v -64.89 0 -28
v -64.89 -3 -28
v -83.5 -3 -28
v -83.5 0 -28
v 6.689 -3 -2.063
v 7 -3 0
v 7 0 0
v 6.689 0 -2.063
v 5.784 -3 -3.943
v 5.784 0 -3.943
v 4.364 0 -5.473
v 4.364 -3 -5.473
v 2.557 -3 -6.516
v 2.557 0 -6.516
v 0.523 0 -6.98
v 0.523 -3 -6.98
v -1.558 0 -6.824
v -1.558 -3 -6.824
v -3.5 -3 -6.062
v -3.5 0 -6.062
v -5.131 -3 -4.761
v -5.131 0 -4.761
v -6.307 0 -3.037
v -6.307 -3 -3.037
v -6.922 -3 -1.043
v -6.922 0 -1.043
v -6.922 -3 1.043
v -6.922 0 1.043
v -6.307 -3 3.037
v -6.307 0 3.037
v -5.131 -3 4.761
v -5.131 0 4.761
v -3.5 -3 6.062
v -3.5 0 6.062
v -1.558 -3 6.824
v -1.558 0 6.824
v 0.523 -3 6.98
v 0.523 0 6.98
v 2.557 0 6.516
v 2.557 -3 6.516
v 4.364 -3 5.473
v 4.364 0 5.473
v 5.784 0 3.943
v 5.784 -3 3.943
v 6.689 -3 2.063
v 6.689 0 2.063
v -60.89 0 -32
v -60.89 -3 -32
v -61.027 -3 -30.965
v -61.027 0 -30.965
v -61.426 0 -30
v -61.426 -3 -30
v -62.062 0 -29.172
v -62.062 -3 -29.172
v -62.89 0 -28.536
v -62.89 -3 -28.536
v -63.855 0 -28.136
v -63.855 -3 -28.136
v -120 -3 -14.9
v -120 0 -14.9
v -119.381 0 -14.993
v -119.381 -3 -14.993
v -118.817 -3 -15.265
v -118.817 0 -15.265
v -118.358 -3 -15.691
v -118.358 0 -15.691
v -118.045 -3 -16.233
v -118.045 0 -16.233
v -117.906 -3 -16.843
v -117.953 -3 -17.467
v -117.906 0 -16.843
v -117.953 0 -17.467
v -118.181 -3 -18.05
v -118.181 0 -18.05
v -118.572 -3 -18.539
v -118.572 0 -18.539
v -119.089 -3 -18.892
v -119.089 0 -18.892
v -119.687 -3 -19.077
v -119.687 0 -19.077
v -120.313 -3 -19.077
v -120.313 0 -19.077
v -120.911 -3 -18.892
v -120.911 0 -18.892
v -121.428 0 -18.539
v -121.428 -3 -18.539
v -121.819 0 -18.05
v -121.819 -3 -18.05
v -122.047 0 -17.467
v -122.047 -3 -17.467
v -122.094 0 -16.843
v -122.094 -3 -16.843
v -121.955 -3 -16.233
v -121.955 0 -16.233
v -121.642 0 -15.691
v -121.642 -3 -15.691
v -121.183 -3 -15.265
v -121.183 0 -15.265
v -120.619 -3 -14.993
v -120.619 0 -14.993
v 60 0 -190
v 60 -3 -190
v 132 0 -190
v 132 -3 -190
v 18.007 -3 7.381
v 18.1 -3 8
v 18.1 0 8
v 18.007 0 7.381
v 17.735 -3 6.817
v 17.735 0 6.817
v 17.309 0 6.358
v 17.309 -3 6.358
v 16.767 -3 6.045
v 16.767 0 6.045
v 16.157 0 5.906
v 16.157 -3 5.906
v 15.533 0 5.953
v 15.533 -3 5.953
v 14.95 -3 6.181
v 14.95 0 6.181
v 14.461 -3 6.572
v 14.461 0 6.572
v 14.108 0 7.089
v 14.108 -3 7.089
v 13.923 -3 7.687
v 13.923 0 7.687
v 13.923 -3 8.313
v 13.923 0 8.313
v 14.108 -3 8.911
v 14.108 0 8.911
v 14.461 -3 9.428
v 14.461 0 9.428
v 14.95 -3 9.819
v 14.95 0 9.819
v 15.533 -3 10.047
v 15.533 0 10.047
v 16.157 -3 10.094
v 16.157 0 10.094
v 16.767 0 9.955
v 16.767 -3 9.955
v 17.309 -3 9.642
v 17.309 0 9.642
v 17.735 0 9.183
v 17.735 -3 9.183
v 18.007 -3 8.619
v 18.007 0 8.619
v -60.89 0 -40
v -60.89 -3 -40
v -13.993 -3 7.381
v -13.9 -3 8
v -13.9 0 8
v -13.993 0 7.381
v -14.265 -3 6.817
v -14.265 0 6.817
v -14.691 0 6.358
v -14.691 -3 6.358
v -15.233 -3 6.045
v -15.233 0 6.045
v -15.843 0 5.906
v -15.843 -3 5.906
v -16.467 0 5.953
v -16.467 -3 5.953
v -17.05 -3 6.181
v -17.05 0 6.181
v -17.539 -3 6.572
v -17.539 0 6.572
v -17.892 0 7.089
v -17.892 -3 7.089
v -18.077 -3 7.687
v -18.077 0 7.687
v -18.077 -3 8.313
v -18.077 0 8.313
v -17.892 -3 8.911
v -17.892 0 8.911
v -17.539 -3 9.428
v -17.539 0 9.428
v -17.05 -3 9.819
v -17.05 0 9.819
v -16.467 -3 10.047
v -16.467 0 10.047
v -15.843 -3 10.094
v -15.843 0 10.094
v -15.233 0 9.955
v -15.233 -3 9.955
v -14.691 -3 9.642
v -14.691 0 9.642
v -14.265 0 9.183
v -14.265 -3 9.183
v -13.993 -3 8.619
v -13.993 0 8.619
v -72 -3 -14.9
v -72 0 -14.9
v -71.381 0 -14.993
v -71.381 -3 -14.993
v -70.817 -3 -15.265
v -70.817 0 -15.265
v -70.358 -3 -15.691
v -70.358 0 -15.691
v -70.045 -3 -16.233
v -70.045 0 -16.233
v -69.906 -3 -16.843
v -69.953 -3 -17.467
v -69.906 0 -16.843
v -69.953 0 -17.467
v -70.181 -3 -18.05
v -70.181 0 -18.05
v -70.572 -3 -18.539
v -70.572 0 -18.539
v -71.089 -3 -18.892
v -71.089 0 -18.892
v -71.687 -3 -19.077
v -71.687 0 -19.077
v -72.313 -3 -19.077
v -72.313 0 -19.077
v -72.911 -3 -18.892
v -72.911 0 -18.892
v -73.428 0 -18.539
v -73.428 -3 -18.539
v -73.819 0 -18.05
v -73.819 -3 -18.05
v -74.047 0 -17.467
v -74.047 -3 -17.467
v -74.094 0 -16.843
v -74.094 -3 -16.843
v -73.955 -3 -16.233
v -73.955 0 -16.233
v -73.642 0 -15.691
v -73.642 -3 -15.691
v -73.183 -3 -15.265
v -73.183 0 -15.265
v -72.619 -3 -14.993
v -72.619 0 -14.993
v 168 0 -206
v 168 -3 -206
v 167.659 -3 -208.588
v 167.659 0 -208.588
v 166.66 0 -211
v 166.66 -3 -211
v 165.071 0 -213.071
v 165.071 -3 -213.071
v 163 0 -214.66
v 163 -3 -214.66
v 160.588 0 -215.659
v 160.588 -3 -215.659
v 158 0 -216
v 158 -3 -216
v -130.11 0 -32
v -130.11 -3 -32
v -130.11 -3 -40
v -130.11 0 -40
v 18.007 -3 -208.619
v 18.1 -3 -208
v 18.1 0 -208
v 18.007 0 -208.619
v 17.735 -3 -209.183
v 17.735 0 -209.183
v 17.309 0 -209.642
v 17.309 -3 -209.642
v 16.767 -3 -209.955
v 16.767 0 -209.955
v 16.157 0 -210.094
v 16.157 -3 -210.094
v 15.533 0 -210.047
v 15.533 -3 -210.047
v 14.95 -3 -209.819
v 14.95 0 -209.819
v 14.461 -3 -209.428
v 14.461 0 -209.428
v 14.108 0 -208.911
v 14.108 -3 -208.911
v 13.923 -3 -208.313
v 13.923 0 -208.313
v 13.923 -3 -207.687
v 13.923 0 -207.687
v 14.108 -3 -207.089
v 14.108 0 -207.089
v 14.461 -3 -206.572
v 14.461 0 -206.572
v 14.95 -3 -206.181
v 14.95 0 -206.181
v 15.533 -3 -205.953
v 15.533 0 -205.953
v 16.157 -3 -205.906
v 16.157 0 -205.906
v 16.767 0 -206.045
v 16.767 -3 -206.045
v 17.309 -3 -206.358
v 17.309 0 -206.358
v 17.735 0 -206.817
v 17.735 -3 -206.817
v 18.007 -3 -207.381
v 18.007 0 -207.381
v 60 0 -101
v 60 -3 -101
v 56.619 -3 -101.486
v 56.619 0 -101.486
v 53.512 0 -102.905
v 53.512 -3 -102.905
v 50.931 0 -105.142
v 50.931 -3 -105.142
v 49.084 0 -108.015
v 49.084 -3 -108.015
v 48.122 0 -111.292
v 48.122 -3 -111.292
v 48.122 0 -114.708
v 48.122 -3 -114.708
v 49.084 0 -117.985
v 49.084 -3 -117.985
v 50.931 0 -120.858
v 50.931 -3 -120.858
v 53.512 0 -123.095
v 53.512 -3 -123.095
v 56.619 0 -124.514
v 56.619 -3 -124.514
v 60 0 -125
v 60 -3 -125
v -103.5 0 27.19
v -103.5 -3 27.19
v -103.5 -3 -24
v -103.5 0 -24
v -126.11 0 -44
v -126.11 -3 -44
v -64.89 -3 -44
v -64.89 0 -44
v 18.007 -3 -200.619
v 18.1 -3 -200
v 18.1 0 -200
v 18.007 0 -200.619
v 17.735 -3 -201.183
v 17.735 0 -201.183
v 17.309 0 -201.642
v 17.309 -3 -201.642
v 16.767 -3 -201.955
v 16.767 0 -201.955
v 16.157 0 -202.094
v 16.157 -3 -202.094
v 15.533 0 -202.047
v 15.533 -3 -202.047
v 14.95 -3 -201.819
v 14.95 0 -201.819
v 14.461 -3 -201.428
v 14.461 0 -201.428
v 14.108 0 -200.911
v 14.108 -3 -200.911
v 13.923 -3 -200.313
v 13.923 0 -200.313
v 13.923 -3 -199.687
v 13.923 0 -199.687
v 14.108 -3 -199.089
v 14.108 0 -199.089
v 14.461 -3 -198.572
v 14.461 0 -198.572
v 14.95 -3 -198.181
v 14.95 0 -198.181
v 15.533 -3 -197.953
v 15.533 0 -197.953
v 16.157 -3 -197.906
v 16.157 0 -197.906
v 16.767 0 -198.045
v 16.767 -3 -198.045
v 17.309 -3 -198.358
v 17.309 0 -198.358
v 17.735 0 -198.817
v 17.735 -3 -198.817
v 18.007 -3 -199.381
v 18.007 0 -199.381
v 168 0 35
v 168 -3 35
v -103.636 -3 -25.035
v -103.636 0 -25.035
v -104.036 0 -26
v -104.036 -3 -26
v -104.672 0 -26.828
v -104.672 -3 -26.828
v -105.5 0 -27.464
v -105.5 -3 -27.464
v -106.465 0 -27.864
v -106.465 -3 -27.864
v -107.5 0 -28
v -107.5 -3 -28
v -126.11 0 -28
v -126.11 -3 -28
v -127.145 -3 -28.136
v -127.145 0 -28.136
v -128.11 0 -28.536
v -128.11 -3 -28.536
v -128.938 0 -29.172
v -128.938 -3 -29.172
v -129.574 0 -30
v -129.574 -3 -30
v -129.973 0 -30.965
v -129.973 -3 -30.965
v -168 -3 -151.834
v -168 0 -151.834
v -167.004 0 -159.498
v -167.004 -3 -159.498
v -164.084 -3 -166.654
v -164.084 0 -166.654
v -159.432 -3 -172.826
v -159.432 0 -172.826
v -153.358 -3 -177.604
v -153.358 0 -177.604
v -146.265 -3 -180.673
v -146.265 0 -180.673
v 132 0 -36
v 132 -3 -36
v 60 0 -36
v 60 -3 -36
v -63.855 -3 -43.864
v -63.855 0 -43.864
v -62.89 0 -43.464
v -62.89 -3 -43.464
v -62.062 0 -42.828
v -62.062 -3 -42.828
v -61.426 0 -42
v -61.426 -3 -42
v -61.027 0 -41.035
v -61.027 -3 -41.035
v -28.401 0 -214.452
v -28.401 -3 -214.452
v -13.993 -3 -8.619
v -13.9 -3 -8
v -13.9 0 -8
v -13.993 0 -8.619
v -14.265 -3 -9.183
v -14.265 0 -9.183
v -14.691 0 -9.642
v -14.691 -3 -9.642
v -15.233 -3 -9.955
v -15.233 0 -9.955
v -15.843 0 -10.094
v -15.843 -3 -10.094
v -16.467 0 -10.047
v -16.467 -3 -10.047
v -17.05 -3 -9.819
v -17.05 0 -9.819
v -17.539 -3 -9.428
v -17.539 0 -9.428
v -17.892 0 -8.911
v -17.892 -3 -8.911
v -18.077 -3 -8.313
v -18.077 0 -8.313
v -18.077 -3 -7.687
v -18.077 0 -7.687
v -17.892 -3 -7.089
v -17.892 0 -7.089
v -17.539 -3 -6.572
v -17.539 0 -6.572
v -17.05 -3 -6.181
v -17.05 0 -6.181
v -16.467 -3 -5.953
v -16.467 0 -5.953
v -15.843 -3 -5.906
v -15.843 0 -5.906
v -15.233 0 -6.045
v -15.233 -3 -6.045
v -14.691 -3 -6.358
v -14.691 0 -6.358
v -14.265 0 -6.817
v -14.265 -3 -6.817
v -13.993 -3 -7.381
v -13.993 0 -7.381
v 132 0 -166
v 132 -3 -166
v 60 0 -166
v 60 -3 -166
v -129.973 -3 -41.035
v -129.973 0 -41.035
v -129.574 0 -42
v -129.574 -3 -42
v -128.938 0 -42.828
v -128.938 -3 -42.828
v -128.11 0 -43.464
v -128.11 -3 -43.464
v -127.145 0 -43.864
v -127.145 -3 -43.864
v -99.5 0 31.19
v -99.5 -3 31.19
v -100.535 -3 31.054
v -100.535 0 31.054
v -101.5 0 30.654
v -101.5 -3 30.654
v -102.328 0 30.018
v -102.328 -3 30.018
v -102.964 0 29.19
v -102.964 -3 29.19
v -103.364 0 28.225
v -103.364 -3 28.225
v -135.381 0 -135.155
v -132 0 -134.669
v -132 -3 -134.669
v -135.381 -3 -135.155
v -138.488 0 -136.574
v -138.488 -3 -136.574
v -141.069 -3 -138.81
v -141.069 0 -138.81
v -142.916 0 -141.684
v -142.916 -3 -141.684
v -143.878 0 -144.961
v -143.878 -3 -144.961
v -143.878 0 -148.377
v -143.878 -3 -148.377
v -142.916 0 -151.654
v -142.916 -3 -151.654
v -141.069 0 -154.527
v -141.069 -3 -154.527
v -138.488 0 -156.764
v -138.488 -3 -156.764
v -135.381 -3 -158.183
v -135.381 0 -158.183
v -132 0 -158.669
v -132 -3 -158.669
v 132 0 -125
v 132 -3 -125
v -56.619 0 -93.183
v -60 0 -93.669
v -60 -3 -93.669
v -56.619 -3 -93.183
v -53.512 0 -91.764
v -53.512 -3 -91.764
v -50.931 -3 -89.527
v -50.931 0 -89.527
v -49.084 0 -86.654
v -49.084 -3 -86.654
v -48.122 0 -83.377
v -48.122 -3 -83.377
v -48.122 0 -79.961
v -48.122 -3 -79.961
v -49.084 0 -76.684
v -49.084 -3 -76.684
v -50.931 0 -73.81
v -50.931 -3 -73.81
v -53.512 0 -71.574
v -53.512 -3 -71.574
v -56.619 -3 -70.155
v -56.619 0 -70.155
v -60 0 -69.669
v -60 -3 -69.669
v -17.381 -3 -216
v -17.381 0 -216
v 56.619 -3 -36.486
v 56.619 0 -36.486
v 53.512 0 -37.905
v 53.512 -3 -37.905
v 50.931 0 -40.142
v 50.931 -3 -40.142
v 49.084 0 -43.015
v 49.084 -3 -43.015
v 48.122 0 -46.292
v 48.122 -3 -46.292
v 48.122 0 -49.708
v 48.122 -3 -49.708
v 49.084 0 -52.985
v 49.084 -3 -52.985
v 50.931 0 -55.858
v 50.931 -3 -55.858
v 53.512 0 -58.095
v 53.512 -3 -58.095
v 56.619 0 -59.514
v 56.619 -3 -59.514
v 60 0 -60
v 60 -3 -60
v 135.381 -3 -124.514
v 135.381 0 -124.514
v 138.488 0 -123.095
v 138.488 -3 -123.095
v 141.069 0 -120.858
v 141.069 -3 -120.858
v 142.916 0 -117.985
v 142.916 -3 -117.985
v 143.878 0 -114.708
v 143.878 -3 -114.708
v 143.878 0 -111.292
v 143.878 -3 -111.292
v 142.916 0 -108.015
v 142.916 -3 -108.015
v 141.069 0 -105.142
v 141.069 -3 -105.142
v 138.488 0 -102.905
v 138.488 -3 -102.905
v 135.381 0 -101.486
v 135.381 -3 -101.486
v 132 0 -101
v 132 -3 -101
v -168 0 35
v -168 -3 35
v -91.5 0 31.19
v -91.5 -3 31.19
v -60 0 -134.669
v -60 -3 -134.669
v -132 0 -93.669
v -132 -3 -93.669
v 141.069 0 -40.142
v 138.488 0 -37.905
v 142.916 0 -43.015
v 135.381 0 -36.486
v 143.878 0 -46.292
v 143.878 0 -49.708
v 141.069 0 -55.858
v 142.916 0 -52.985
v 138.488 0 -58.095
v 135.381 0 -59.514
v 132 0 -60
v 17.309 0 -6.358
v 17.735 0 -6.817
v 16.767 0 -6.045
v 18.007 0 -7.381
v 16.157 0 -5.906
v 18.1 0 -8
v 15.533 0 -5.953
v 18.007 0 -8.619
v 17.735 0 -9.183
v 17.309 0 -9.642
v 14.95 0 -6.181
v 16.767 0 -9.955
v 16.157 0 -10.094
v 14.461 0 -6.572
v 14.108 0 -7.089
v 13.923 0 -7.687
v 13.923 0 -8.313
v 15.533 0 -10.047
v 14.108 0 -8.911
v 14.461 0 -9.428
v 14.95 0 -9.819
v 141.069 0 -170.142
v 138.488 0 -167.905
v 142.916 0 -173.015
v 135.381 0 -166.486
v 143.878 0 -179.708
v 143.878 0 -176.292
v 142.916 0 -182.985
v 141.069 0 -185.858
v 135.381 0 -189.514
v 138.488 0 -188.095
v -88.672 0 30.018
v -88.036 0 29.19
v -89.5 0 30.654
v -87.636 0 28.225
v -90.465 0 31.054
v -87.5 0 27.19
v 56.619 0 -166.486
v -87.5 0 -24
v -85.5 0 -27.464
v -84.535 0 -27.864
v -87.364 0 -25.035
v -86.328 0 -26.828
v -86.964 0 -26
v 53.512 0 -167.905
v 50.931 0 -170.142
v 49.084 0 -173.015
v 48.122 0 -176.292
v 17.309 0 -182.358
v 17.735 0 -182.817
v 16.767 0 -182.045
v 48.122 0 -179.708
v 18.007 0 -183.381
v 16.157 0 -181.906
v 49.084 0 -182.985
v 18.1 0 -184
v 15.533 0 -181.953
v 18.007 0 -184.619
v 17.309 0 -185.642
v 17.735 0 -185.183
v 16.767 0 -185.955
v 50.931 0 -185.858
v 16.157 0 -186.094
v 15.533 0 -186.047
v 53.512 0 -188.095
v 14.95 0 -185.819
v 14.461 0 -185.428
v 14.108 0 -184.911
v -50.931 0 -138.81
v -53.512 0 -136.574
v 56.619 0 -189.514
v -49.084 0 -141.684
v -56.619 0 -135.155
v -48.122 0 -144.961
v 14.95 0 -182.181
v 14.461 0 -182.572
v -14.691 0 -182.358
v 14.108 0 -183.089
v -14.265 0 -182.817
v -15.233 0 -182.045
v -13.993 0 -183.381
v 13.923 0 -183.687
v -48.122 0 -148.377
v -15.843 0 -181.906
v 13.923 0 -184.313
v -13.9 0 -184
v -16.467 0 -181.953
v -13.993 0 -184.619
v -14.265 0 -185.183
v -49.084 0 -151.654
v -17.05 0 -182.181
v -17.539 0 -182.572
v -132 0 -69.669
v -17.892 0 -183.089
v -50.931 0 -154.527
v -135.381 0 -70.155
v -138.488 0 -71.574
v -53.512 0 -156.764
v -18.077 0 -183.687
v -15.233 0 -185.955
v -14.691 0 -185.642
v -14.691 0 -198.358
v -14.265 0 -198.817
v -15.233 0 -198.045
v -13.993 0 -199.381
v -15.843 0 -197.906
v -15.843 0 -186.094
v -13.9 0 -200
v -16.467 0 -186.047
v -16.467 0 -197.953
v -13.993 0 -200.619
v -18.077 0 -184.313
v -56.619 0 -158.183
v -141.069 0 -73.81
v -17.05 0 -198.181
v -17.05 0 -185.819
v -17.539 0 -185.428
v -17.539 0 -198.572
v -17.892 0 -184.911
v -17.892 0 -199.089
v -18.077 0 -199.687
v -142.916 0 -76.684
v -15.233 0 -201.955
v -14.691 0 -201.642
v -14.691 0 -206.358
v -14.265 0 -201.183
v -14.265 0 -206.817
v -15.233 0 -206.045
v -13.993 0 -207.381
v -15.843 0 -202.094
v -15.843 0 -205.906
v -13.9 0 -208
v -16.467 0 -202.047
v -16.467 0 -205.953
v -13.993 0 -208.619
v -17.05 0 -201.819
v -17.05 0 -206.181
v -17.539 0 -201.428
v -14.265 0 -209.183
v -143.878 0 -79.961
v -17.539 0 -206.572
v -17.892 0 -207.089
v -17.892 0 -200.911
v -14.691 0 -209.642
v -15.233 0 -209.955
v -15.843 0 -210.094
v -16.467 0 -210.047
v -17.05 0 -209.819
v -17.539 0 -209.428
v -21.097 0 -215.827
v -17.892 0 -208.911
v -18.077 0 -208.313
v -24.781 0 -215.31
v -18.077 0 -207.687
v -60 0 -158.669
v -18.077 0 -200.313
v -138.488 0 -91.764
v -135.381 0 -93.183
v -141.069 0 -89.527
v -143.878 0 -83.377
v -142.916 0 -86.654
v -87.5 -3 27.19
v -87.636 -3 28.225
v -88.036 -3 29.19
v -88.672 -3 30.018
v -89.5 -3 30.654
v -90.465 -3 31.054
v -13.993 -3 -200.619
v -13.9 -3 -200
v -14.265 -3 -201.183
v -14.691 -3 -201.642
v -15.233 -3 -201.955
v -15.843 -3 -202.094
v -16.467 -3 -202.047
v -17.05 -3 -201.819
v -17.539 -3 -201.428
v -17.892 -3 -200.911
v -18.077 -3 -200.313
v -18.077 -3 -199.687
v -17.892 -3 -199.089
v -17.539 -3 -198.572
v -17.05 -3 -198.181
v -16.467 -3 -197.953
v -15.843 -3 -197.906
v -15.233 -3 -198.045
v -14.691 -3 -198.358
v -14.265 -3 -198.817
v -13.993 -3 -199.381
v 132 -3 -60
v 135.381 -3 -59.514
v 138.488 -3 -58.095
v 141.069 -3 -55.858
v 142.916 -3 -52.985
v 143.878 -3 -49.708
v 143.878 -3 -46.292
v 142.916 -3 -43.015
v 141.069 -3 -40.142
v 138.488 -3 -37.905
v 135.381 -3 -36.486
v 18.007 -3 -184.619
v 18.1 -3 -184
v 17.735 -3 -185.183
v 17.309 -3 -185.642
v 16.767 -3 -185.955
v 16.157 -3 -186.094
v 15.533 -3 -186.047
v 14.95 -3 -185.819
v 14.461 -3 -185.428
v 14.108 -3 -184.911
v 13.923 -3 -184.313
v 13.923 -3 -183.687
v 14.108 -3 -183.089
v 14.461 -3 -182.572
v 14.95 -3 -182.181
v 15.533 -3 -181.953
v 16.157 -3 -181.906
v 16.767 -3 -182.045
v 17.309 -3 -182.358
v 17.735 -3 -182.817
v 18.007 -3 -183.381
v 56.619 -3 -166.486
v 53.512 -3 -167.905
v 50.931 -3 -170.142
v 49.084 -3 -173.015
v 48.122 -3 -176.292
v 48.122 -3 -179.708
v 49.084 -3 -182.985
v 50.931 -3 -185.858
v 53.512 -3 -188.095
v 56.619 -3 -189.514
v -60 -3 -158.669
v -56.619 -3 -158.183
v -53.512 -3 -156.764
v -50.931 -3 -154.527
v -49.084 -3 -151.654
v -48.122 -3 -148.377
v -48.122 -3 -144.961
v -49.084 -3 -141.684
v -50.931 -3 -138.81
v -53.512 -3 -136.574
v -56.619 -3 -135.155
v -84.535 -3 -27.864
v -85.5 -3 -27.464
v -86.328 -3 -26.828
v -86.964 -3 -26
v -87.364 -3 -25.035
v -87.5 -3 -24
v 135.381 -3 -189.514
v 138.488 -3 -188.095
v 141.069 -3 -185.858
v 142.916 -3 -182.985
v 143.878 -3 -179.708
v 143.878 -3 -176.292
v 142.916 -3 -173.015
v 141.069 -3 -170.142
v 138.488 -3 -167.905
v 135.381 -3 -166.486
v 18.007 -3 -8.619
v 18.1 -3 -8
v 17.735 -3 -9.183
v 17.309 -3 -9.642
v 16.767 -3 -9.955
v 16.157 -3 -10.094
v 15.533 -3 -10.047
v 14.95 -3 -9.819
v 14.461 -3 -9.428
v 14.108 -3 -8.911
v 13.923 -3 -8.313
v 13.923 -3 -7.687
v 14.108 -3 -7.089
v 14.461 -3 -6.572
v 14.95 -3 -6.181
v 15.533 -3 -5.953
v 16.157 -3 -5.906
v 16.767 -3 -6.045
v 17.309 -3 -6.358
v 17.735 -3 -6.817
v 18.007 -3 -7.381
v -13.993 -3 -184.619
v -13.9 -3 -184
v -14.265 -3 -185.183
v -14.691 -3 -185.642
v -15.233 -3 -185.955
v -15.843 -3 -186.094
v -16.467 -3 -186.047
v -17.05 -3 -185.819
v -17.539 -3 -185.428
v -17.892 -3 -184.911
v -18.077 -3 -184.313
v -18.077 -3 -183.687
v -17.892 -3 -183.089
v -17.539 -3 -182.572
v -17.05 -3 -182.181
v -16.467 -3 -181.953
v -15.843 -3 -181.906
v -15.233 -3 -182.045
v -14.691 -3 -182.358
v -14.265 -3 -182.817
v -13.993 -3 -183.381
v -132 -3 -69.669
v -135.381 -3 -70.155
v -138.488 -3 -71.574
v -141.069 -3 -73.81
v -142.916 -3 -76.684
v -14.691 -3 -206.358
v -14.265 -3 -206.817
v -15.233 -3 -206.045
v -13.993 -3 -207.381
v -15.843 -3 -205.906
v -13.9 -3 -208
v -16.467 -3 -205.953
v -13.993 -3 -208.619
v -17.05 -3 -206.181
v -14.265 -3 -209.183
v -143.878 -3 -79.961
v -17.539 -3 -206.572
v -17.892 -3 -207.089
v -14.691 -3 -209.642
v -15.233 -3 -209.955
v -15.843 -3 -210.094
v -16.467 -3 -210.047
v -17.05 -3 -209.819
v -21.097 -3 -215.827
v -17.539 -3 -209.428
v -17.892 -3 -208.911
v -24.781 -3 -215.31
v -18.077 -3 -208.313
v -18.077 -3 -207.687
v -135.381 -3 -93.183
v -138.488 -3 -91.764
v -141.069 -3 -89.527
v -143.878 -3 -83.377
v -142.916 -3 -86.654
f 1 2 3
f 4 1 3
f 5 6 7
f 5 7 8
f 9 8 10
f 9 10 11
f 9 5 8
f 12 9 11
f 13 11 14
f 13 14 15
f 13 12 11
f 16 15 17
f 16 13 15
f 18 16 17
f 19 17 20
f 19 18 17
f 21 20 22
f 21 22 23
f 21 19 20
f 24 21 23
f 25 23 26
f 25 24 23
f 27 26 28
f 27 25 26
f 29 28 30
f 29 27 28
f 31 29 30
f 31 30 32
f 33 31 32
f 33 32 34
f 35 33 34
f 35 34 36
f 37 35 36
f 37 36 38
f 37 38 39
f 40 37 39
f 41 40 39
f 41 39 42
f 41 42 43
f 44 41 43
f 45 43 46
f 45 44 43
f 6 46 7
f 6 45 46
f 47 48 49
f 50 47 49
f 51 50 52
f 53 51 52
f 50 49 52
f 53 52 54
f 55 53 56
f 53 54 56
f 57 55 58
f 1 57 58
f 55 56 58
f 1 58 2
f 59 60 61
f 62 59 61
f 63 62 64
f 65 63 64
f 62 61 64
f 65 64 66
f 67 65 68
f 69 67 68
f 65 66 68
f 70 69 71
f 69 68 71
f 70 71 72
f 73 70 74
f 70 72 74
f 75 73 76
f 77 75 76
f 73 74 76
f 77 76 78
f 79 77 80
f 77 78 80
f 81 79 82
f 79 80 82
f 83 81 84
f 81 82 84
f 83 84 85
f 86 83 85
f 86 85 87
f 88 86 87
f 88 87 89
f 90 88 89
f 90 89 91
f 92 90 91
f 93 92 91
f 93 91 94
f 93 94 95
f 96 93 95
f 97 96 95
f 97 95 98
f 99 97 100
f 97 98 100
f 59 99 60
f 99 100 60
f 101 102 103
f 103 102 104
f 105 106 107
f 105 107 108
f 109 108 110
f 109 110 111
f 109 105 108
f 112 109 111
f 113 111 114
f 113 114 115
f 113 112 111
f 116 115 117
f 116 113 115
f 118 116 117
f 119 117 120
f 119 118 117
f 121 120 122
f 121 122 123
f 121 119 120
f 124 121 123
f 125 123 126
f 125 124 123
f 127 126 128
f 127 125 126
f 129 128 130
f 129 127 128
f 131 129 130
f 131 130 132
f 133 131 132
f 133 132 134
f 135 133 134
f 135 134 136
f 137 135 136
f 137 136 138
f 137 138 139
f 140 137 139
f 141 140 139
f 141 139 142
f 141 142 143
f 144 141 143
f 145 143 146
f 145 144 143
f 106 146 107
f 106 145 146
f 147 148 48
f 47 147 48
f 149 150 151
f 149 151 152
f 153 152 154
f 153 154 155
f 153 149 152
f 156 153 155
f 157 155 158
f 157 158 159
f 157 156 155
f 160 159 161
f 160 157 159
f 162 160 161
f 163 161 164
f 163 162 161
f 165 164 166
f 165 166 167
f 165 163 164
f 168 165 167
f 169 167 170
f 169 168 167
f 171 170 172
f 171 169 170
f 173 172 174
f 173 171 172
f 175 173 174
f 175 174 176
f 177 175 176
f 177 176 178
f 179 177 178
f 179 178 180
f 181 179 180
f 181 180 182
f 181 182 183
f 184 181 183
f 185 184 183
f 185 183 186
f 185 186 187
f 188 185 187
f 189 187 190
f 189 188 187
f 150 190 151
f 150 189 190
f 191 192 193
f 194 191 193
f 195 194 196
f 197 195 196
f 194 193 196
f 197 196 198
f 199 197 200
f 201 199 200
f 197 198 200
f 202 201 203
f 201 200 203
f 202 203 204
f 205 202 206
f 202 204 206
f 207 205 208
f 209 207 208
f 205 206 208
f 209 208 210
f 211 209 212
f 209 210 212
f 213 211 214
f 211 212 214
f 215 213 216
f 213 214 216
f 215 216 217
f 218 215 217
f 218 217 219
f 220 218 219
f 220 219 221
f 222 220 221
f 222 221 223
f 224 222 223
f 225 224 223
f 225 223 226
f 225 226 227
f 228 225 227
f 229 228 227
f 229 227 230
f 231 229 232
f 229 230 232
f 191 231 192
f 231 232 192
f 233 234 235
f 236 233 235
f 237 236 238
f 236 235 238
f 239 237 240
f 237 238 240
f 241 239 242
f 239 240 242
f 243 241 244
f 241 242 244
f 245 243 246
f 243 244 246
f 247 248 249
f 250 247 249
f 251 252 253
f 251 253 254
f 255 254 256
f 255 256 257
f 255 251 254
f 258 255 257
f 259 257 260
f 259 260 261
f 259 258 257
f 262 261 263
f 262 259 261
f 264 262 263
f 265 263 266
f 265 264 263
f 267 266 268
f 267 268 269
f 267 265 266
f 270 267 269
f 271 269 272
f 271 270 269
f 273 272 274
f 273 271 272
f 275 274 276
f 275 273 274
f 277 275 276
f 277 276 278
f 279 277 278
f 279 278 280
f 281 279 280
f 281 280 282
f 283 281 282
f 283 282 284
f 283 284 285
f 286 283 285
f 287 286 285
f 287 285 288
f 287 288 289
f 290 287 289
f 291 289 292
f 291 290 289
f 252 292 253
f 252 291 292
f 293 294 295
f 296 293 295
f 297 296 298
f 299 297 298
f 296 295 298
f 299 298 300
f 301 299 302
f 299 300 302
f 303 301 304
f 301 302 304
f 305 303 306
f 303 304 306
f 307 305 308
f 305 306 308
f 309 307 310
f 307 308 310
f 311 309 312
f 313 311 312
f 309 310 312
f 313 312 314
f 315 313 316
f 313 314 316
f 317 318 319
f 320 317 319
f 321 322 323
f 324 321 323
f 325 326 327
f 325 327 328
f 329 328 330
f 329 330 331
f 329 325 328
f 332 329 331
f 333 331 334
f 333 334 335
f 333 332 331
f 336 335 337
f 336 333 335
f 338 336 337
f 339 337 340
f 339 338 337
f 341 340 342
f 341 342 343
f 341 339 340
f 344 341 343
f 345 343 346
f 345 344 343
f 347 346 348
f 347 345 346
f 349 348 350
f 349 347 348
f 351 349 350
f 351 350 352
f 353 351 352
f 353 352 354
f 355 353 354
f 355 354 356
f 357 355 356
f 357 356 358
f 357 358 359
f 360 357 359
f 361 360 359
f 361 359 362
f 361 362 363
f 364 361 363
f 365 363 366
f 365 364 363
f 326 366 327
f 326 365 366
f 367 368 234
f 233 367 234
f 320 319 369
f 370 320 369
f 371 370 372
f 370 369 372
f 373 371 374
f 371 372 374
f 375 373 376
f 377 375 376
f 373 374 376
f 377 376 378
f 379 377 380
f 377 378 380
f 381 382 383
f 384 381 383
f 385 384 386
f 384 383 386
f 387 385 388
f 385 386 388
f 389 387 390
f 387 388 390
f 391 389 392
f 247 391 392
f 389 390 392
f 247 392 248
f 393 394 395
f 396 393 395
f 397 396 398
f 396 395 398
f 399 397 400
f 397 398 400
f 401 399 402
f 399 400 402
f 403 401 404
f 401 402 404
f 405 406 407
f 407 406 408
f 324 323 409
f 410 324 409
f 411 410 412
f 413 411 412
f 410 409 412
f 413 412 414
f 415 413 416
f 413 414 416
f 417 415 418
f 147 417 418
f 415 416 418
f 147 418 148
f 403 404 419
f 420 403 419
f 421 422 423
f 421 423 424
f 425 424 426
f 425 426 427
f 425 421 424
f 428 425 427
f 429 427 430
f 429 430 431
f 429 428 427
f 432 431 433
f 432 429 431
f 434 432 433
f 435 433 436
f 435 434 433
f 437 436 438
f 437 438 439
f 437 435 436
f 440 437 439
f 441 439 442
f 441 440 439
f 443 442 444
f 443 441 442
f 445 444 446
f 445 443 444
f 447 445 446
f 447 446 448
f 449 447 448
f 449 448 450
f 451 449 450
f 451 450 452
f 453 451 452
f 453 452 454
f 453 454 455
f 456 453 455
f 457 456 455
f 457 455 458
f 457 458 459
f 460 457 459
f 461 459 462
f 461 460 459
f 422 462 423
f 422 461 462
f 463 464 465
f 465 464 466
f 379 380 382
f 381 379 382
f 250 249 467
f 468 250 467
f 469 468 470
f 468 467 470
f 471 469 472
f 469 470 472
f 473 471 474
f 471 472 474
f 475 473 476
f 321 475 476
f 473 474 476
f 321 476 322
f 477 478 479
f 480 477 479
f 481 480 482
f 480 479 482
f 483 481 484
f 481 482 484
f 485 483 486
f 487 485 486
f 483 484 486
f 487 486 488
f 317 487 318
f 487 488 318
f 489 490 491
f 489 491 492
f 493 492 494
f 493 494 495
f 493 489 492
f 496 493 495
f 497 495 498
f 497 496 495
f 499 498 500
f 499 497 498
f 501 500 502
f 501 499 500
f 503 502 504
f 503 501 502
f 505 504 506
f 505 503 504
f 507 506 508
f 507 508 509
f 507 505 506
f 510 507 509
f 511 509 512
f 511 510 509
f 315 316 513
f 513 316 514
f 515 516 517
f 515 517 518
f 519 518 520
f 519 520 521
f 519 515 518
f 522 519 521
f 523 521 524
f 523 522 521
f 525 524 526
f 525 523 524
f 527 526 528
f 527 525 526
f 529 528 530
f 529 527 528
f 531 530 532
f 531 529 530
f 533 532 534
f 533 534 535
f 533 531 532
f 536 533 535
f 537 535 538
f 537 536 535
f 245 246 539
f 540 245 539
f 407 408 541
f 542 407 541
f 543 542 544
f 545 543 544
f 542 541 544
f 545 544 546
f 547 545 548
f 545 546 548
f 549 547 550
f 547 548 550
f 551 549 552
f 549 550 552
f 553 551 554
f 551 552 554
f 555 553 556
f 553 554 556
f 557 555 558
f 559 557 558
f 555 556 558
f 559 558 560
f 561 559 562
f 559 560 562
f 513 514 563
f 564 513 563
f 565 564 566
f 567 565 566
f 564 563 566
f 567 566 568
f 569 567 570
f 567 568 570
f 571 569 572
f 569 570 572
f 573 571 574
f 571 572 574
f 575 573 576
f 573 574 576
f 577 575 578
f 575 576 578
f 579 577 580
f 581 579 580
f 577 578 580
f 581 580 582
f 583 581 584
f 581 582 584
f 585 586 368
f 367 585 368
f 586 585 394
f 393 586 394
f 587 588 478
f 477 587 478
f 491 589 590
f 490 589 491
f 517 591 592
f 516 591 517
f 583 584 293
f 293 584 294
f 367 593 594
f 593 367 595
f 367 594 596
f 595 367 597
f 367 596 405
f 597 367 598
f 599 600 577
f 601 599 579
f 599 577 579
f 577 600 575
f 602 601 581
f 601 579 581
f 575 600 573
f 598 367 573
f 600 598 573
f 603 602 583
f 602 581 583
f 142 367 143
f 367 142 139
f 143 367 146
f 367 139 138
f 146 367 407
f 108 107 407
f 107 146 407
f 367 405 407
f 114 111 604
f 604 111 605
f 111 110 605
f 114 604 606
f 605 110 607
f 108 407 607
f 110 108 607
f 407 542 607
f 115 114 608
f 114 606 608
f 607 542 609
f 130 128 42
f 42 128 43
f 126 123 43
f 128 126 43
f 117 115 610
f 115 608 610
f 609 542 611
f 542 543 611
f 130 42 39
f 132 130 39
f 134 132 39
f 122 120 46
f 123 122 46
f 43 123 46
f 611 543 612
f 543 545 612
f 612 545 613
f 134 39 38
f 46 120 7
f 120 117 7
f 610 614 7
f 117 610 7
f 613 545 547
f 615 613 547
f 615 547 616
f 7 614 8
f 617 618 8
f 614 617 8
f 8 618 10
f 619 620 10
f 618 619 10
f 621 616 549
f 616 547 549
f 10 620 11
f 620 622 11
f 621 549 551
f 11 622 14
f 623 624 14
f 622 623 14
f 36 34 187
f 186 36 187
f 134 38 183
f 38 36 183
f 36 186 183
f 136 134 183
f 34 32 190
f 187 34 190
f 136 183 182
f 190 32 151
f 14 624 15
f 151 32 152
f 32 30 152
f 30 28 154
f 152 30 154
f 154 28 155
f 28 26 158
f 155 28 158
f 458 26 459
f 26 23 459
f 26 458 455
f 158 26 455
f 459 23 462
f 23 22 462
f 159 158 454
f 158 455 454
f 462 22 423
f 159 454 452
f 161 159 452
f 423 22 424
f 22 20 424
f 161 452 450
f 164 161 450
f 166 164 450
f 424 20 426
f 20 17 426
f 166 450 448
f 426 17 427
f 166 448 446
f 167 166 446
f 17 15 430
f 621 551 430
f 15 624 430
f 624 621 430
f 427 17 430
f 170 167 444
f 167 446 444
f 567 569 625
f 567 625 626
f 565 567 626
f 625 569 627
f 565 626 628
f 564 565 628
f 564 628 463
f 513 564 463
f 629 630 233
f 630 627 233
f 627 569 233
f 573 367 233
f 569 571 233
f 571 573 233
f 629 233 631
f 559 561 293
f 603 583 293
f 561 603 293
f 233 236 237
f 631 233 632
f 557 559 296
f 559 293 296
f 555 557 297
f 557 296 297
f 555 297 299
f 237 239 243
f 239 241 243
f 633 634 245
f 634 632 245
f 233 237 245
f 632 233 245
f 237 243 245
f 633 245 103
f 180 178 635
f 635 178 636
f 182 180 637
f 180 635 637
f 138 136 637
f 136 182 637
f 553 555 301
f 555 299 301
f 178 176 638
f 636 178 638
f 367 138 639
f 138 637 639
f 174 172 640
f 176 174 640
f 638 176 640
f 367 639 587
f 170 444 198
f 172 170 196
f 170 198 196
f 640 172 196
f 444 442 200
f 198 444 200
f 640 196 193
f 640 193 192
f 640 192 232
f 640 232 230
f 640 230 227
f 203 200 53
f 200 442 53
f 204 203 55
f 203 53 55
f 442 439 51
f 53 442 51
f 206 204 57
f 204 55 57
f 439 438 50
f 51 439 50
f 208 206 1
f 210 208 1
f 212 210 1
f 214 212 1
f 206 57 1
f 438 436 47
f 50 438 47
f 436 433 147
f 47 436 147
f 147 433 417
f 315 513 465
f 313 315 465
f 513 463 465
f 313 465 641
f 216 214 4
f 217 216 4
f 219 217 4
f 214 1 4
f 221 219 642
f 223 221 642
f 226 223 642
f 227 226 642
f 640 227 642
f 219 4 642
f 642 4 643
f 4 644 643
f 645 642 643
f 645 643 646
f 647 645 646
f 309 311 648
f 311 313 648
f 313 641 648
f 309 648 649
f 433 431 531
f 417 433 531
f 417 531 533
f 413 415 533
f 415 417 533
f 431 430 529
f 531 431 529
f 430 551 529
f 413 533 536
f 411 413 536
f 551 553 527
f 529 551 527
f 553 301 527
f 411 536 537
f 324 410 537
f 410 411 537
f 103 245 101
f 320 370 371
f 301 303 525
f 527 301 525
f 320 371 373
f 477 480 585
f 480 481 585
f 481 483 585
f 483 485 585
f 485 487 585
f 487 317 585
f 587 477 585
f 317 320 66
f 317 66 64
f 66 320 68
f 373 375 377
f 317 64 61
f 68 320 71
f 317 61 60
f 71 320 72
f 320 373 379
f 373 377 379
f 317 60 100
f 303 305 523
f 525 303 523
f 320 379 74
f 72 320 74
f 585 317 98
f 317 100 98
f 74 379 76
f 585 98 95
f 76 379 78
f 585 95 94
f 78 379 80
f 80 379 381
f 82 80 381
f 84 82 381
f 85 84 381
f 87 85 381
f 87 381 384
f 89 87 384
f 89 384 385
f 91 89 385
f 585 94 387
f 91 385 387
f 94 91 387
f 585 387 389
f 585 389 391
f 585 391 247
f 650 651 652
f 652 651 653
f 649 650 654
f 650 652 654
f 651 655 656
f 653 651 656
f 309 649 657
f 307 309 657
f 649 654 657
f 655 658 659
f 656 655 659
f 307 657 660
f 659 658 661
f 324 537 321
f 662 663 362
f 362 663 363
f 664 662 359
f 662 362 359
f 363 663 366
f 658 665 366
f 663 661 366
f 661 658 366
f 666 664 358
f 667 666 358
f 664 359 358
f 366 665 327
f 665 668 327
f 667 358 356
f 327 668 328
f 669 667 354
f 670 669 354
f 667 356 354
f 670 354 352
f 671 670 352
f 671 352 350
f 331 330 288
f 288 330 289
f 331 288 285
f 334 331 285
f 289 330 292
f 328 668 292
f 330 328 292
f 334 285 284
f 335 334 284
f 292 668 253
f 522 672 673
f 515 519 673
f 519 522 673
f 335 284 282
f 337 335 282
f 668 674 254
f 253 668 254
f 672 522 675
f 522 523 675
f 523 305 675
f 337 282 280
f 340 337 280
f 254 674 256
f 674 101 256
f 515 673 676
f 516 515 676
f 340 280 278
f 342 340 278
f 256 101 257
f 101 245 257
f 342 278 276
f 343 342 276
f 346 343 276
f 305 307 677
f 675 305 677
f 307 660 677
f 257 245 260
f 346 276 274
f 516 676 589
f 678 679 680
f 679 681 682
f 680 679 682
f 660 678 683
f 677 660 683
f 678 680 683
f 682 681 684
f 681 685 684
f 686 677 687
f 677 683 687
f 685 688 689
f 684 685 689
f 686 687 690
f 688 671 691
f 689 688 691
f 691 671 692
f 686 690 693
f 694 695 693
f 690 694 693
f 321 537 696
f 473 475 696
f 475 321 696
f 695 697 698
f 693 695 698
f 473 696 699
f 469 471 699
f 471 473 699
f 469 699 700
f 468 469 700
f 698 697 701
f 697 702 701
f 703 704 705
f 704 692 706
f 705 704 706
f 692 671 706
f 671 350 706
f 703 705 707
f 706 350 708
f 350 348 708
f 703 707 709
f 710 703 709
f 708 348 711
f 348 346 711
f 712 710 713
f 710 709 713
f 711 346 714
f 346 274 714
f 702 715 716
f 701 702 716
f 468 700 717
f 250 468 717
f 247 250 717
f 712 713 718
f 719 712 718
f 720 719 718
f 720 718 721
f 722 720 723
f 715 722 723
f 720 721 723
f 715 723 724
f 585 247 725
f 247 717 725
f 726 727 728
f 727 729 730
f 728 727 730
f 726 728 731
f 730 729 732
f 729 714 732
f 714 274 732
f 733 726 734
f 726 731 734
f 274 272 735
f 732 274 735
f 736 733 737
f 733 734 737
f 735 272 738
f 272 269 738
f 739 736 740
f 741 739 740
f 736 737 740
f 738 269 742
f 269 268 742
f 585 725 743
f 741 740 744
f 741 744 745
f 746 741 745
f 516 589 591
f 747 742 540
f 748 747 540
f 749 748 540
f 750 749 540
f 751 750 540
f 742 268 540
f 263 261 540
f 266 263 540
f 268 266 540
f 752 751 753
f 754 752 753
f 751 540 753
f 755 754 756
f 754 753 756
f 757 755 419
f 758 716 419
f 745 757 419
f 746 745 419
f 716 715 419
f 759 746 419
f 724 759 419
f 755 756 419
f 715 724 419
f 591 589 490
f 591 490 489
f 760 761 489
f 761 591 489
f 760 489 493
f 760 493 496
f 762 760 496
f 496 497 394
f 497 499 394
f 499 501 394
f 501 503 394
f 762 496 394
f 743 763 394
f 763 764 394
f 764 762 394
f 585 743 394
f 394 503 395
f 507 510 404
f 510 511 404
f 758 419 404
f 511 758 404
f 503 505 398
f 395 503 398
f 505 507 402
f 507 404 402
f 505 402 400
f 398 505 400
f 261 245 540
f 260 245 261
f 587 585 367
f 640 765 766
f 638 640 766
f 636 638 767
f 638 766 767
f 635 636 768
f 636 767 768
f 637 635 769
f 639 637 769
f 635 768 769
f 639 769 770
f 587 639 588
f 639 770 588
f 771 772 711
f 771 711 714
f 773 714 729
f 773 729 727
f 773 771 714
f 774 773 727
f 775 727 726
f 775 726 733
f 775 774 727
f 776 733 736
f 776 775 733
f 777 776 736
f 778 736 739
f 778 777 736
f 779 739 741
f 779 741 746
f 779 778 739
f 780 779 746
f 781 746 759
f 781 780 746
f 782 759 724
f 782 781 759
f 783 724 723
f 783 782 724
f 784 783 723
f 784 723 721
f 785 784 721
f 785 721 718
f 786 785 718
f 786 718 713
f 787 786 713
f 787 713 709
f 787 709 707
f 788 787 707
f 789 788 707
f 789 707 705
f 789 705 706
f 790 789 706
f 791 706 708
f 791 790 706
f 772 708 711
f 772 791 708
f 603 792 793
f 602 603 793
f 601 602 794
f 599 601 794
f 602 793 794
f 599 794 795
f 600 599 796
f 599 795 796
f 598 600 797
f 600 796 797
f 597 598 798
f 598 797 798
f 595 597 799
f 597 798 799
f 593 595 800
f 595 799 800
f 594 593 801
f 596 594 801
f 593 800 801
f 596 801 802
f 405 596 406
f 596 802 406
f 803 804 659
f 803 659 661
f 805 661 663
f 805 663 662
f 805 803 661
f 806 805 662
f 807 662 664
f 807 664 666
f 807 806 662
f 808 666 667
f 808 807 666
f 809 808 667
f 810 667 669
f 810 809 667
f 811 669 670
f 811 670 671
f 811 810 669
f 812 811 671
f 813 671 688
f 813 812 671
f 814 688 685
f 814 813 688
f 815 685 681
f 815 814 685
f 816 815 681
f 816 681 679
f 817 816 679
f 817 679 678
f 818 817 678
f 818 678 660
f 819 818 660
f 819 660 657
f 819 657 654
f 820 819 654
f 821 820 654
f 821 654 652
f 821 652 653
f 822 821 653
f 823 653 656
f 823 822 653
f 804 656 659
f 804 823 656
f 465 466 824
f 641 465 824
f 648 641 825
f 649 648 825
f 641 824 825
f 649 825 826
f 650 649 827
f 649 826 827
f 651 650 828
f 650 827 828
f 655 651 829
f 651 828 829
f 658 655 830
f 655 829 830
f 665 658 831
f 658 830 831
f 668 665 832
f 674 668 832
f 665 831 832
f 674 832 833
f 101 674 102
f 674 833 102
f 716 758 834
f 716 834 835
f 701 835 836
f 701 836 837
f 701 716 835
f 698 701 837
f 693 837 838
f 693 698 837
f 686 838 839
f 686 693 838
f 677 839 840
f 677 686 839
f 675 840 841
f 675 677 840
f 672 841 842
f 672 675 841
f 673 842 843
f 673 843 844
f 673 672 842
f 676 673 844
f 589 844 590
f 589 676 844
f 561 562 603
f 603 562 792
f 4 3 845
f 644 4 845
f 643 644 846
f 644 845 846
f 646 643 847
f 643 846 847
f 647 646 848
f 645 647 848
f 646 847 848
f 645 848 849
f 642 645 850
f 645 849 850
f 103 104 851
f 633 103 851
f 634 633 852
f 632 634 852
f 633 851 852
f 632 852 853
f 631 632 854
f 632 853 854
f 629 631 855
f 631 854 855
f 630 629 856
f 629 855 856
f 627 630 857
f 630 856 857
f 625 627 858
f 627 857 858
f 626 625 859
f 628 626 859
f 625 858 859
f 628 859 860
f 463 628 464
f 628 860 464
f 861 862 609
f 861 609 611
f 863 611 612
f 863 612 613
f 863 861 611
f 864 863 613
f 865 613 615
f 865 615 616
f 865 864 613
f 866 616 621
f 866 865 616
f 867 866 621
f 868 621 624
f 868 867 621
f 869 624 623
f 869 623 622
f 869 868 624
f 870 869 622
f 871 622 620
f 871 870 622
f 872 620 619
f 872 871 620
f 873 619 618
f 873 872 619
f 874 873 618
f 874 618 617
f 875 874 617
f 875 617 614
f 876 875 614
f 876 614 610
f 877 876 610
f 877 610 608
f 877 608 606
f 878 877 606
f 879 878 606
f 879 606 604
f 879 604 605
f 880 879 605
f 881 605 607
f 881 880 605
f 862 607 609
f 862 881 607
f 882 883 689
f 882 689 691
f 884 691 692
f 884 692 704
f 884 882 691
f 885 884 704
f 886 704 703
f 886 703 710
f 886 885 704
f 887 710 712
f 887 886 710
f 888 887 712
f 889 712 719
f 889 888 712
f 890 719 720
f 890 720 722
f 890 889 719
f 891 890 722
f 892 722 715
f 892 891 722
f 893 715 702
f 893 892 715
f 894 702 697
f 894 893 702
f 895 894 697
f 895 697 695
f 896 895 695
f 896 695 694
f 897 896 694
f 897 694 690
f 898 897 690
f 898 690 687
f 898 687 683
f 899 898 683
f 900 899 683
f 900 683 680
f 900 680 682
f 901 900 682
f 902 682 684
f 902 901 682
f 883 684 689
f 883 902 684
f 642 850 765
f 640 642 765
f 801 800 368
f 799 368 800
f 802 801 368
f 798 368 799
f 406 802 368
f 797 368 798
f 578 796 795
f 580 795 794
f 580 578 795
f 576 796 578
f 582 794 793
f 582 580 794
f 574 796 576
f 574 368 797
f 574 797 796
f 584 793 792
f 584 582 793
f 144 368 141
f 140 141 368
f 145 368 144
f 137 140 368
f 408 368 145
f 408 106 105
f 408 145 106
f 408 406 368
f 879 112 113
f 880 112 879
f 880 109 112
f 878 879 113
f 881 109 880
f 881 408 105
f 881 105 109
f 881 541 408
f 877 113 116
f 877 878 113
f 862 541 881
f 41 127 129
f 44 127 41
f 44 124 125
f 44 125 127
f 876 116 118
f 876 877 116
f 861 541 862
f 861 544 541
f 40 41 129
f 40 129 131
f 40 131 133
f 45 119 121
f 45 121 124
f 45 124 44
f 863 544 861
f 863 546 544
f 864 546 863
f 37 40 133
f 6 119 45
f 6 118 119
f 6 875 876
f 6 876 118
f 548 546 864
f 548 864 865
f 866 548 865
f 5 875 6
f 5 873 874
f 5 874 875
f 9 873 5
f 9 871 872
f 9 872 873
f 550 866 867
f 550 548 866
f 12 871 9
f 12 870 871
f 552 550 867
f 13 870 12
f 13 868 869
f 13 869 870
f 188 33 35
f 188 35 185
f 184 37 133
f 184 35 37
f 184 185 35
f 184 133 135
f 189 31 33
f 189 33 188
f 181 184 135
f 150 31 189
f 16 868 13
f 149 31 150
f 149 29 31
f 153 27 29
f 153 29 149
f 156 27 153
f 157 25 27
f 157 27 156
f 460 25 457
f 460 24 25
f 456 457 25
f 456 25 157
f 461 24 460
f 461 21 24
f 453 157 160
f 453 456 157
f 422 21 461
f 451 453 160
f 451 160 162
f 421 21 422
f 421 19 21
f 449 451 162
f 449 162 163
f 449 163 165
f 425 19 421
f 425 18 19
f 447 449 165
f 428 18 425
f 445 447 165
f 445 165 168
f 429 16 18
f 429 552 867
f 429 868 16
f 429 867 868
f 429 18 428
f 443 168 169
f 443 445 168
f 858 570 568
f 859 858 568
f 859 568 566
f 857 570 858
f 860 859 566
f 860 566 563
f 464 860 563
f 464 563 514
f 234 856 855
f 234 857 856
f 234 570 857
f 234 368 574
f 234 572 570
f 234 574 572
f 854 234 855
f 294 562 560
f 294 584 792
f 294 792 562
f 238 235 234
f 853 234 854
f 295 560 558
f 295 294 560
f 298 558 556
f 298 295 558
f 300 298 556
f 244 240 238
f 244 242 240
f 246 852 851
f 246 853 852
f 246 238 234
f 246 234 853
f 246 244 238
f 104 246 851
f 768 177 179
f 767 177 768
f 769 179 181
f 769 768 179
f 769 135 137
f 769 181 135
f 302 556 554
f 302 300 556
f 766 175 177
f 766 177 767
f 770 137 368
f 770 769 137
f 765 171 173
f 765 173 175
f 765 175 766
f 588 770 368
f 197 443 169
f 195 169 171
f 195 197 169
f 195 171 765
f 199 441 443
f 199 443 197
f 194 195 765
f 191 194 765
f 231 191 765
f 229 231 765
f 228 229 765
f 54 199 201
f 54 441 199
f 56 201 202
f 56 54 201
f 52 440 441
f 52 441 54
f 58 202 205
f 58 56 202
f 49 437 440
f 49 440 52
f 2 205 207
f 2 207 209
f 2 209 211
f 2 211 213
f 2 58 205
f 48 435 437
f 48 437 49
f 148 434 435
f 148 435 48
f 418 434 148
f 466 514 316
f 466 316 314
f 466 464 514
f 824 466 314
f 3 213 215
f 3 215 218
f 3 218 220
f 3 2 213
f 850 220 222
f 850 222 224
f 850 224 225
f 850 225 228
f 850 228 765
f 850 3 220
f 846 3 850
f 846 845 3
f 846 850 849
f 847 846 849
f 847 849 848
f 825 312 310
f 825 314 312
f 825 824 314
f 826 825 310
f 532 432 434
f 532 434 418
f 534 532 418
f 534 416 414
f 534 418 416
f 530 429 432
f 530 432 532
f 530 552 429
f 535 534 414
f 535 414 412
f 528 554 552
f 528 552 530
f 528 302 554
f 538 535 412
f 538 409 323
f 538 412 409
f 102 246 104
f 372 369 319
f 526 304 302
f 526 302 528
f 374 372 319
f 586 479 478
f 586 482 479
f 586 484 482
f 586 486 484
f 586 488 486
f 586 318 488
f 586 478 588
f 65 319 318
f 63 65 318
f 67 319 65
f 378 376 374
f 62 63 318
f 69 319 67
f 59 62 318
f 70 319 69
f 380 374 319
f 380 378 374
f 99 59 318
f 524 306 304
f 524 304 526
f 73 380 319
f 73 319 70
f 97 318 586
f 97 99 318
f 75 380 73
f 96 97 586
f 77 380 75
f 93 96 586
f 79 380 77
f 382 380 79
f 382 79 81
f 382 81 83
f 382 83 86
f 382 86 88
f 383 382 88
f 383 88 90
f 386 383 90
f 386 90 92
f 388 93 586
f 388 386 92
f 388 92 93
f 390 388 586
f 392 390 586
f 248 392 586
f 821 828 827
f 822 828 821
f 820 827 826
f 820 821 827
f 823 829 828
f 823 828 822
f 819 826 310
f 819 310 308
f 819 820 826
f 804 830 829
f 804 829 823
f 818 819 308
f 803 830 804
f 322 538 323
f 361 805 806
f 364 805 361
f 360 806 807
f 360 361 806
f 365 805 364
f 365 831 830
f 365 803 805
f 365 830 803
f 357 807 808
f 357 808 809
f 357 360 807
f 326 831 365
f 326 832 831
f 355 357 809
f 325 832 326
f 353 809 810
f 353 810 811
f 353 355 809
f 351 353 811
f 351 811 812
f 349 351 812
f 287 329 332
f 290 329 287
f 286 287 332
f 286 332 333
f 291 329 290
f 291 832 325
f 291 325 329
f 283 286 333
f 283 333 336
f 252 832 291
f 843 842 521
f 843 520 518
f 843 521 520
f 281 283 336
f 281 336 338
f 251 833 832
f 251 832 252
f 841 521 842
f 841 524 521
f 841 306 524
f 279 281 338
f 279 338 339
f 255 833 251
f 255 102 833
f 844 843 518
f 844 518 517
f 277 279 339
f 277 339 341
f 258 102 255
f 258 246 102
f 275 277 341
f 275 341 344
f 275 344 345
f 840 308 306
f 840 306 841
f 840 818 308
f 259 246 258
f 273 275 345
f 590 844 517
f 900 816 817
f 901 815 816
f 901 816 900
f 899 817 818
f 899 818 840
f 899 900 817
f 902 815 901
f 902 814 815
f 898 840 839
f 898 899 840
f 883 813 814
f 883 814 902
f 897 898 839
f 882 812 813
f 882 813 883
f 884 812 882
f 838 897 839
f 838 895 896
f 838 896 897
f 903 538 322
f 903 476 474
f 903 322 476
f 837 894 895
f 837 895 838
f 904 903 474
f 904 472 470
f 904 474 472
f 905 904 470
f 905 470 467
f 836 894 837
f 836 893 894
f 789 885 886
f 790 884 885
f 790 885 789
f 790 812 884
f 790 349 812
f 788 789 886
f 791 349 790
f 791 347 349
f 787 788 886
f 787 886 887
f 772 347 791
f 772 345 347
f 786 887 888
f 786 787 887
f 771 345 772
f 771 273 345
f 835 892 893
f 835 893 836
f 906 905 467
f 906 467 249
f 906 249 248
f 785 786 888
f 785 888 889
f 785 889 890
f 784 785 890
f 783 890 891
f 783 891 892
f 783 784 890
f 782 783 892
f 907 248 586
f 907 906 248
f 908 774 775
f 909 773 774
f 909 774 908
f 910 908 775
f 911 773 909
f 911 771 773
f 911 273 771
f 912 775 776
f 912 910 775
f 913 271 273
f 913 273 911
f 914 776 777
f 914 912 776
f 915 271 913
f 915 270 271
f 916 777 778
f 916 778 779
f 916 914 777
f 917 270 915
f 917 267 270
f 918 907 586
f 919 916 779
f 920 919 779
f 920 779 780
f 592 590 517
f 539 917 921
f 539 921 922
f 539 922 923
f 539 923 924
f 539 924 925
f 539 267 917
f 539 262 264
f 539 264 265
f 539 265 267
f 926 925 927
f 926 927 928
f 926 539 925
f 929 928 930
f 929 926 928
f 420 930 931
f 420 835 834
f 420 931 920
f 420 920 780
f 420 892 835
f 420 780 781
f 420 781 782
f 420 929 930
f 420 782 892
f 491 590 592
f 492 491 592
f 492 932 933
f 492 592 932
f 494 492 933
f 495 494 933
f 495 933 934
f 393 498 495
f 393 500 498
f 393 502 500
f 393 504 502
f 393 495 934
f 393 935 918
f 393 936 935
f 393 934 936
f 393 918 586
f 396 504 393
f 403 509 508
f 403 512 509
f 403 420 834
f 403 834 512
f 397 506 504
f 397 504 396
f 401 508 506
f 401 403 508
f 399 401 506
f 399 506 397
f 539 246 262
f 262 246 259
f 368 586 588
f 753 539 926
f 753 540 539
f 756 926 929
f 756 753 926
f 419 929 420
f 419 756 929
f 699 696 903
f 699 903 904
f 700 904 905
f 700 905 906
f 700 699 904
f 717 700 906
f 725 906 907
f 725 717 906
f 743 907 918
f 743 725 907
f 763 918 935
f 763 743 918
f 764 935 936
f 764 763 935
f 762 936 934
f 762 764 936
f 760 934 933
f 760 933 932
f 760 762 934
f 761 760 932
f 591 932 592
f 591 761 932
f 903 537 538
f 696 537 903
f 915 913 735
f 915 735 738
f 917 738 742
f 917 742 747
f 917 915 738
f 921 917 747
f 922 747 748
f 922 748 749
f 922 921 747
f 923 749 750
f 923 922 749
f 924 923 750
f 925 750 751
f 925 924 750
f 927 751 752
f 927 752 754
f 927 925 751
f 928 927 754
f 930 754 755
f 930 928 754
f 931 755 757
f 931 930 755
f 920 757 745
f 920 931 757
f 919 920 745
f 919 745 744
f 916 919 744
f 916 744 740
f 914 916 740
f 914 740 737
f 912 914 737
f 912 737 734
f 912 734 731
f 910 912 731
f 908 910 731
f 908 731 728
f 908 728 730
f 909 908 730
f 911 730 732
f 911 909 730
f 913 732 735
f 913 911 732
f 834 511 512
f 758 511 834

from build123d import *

# Parameters (mm, degrees)
SIDEPLATERIGHT_MIRRORED1_START       = -3
SIDEPLATERIGHT_MIRRORED1_OUTLINE_R   = 2.1
SIDEPLATERIGHT_MIRRORED1_OUTLINE_R_2 = 7
SIDEPLATERIGHT_MIRRORED1_DEPTH       = 3
BOSS_EXTRUDE1_DEPTH                  = 3
FILLET1_R                            = 40
SKETCH3_R                            = 2.1
CUT_EXTRUDE1_DEPTH                   = 3
CUT_EXTRUDE3_DEPTH                   = 274.658546368
CUT_EXTRUDE3_DEPTH_BACK              = 274.658546368
SKETCH5_W                            = 336
SKETCH5_H                            = 4


# Read off the part's stored shape, not the designer's step: sidePlateRight_Mirrored1
with BuildPart() as part:
    # sidePlateRight_Mirrored1 outline → sidePlateRight_Mirrored1 (new body)
    with BuildSketch(Plane(origin=(0, 0, 0), x_dir=(1, 0, 0), z_dir=(0, 1, 0)).offset(SIDEPLATERIGHT_MIRRORED1_START)):
        with BuildLine():
            Line((168, -39), (168, 206))
            ThreePointArc((168, 206), (165.071067812, 213.071067812), (158, 216))
            Line((158, 216), (-23, 216))
            Line((-23, 216), (-23, 60))
            ThreePointArc((-23, 60), (-24.171572875, 57.171572875), (-27, 56))
            Line((-27, 56), (-158, 56))
            ThreePointArc((-158, 56), (-165.071067812, 53.071067812), (-168, 46))
            Line((-168, 46), (-168, -39))
            Line((-168, -39), (168, -39))
        make_face()
        with BuildLine():
            ThreePointArc((-87.5, -27.189984024), (-88.671572875, -30.018411149), (-91.5, -31.189984024))
            Line((-91.5, -31.189984024), (-99.5, -31.189984024))
            ThreePointArc((-99.5, -31.189984024), (-102.328427125, -30.018411149), (-103.5, -27.189984024))
            Line((-103.5, -27.189984024), (-103.5, 24))
            ThreePointArc((-103.5, 24), (-104.671572875, 26.828427125), (-107.5, 28))
            Line((-107.5, 28), (-126.109686491, 28))
            ThreePointArc((-126.109686491, 28), (-128.938113615, 29.171572876), (-130.109686491, 32))
            Line((-130.109686491, 32), (-130.109686491, 40))
            ThreePointArc((-130.109686491, 40), (-128.938113615, 42.828427124), (-126.109686491, 44))
            Line((-126.109686491, 44), (-64.890313509, 44))
            ThreePointArc((-64.890313509, 44), (-62.061886384, 42.828427124), (-60.890313509, 40))
            Line((-60.890313509, 40), (-60.890313509, 32))
            ThreePointArc((-60.890313509, 32), (-62.061886384, 29.171572876), (-64.890313509, 28))
            Line((-64.890313509, 28), (-83.5, 28))
            ThreePointArc((-83.5, 28), (-86.328427125, 26.828427125), (-87.5, 24))
            Line((-87.5, 24), (-87.5, -27.189984024))
        make_face(mode=Mode.SUBTRACT)
        with Locations((-16, -8)):
            Circle(SIDEPLATERIGHT_MIRRORED1_OUTLINE_R, mode=Mode.SUBTRACT)
        with Locations((-16, 8)):
            Circle(SIDEPLATERIGHT_MIRRORED1_OUTLINE_R, mode=Mode.SUBTRACT)
        with Locations((16, -8)):
            Circle(SIDEPLATERIGHT_MIRRORED1_OUTLINE_R, mode=Mode.SUBTRACT)
        Circle(SIDEPLATERIGHT_MIRRORED1_OUTLINE_R_2, mode=Mode.SUBTRACT)
        with Locations((16, 8)):
            Circle(SIDEPLATERIGHT_MIRRORED1_OUTLINE_R, mode=Mode.SUBTRACT)
        with BuildLine():
            ThreePointArc((60, 36), (48, 48), (60, 60))
            Line((60, 60), (132, 60))
            ThreePointArc((132, 60), (144, 48), (132, 36))
            Line((132, 36), (60, 36))
        make_face(mode=Mode.SUBTRACT)
        with Locations((-16, 184)):
            Circle(SIDEPLATERIGHT_MIRRORED1_OUTLINE_R, mode=Mode.SUBTRACT)
        with Locations((-16, 200)):
            Circle(SIDEPLATERIGHT_MIRRORED1_OUTLINE_R, mode=Mode.SUBTRACT)
        with Locations((-16, 208)):
            Circle(SIDEPLATERIGHT_MIRRORED1_OUTLINE_R, mode=Mode.SUBTRACT)
        with BuildLine():
            ThreePointArc((60, 101), (48, 113), (60, 125))
            Line((60, 125), (132, 125))
            ThreePointArc((132, 125), (144, 113), (132, 101))
            Line((132, 101), (60, 101))
        make_face(mode=Mode.SUBTRACT)
        with Locations((16, 184)):
            Circle(SIDEPLATERIGHT_MIRRORED1_OUTLINE_R, mode=Mode.SUBTRACT)
        with Locations((16, 200)):
            Circle(SIDEPLATERIGHT_MIRRORED1_OUTLINE_R, mode=Mode.SUBTRACT)
        with Locations((16, 208)):
            Circle(SIDEPLATERIGHT_MIRRORED1_OUTLINE_R, mode=Mode.SUBTRACT)
        with BuildLine():
            ThreePointArc((60, 166), (48, 178), (60, 190))
            Line((60, 190), (132, 190))
            ThreePointArc((132, 190), (144, 178), (132, 166))
            Line((132, 166), (60, 166))
        make_face(mode=Mode.SUBTRACT)
    extrude(amount=SIDEPLATERIGHT_MIRRORED1_DEPTH)

    # Sketch1 → Boss-Extrude1 (add)
    with BuildSketch(Plane(origin=(0, 0, 0), x_dir=(1, 0, 0), z_dir=(0, 1, 0))):
        with BuildLine():
            Line((-168, 46), (-168, 151.833913223))
            ThreePointArc((-168, 151.833913223), (-161.957805488, 169.890035626), (-146.265096253, 180.672917782))
            Line((-146.265096253, 180.672917782), (-23, 216))
            Line((-23, 216), (-23, 46))
            Line((-23, 46), (-168, 46))
        make_face()
        with BuildLine():
            Line((-132, 93.668808042), (-60, 93.668808042))
            ThreePointArc((-60, 93.668808042), (-48, 81.668808042), (-60, 69.668808042))
            Line((-60, 69.668808042), (-132, 69.668808042))
            ThreePointArc((-132, 69.668808042), (-144, 81.668808042), (-132, 93.668808042))
        make_face(mode=Mode.SUBTRACT)
        with BuildLine():
            Line((-132, 158.668808042), (-60, 158.668808042))
            ThreePointArc((-60, 158.668808042), (-48, 146.668808042), (-60, 134.668808042))
            Line((-60, 134.668808042), (-132, 134.668808042))
            ThreePointArc((-132, 134.668808042), (-144, 146.668808042), (-132, 158.668808042))
        make_face(mode=Mode.SUBTRACT)
    extrude(amount=-BOSS_EXTRUDE1_DEPTH)

    # Fillet1
    fillet1_edges = [part.edges().sort_by_distance(p)[0] for p in [
        (-23, -1.5, -216),
    ]]
    fillet(fillet1_edges, radius=FILLET1_R)

    # Sketch3 → Cut-Extrude1 (cut)
    with BuildSketch(Plane(origin=(0, 0, 0), x_dir=(1, 0, 0), z_dir=(0, 1, 0))):
        with Locations(Location((-120, 17, 0), (0, 0, 270))):
            Circle(SKETCH3_R)
        with Locations(Location((-72, 17, 0), (0, 0, 270))):
            Circle(SKETCH3_R)
    extrude(amount=-CUT_EXTRUDE1_DEPTH, mode=Mode.SUBTRACT)

    # Sketch5 → Cut-Extrude3 (cut, two sides: drawn at the far end of the back side and taken through both)
    with BuildSketch(Plane(origin=(0, 0, 0), x_dir=(1, 0, 0), z_dir=(0, 1, 0)).offset(-CUT_EXTRUDE3_DEPTH_BACK)):
        with Locations((0, -37)):
            Rectangle(SKETCH5_W, SKETCH5_H)
    extrude(amount=CUT_EXTRUDE3_DEPTH + CUT_EXTRUDE3_DEPTH_BACK, mode=Mode.SUBTRACT)


solid = part.part
